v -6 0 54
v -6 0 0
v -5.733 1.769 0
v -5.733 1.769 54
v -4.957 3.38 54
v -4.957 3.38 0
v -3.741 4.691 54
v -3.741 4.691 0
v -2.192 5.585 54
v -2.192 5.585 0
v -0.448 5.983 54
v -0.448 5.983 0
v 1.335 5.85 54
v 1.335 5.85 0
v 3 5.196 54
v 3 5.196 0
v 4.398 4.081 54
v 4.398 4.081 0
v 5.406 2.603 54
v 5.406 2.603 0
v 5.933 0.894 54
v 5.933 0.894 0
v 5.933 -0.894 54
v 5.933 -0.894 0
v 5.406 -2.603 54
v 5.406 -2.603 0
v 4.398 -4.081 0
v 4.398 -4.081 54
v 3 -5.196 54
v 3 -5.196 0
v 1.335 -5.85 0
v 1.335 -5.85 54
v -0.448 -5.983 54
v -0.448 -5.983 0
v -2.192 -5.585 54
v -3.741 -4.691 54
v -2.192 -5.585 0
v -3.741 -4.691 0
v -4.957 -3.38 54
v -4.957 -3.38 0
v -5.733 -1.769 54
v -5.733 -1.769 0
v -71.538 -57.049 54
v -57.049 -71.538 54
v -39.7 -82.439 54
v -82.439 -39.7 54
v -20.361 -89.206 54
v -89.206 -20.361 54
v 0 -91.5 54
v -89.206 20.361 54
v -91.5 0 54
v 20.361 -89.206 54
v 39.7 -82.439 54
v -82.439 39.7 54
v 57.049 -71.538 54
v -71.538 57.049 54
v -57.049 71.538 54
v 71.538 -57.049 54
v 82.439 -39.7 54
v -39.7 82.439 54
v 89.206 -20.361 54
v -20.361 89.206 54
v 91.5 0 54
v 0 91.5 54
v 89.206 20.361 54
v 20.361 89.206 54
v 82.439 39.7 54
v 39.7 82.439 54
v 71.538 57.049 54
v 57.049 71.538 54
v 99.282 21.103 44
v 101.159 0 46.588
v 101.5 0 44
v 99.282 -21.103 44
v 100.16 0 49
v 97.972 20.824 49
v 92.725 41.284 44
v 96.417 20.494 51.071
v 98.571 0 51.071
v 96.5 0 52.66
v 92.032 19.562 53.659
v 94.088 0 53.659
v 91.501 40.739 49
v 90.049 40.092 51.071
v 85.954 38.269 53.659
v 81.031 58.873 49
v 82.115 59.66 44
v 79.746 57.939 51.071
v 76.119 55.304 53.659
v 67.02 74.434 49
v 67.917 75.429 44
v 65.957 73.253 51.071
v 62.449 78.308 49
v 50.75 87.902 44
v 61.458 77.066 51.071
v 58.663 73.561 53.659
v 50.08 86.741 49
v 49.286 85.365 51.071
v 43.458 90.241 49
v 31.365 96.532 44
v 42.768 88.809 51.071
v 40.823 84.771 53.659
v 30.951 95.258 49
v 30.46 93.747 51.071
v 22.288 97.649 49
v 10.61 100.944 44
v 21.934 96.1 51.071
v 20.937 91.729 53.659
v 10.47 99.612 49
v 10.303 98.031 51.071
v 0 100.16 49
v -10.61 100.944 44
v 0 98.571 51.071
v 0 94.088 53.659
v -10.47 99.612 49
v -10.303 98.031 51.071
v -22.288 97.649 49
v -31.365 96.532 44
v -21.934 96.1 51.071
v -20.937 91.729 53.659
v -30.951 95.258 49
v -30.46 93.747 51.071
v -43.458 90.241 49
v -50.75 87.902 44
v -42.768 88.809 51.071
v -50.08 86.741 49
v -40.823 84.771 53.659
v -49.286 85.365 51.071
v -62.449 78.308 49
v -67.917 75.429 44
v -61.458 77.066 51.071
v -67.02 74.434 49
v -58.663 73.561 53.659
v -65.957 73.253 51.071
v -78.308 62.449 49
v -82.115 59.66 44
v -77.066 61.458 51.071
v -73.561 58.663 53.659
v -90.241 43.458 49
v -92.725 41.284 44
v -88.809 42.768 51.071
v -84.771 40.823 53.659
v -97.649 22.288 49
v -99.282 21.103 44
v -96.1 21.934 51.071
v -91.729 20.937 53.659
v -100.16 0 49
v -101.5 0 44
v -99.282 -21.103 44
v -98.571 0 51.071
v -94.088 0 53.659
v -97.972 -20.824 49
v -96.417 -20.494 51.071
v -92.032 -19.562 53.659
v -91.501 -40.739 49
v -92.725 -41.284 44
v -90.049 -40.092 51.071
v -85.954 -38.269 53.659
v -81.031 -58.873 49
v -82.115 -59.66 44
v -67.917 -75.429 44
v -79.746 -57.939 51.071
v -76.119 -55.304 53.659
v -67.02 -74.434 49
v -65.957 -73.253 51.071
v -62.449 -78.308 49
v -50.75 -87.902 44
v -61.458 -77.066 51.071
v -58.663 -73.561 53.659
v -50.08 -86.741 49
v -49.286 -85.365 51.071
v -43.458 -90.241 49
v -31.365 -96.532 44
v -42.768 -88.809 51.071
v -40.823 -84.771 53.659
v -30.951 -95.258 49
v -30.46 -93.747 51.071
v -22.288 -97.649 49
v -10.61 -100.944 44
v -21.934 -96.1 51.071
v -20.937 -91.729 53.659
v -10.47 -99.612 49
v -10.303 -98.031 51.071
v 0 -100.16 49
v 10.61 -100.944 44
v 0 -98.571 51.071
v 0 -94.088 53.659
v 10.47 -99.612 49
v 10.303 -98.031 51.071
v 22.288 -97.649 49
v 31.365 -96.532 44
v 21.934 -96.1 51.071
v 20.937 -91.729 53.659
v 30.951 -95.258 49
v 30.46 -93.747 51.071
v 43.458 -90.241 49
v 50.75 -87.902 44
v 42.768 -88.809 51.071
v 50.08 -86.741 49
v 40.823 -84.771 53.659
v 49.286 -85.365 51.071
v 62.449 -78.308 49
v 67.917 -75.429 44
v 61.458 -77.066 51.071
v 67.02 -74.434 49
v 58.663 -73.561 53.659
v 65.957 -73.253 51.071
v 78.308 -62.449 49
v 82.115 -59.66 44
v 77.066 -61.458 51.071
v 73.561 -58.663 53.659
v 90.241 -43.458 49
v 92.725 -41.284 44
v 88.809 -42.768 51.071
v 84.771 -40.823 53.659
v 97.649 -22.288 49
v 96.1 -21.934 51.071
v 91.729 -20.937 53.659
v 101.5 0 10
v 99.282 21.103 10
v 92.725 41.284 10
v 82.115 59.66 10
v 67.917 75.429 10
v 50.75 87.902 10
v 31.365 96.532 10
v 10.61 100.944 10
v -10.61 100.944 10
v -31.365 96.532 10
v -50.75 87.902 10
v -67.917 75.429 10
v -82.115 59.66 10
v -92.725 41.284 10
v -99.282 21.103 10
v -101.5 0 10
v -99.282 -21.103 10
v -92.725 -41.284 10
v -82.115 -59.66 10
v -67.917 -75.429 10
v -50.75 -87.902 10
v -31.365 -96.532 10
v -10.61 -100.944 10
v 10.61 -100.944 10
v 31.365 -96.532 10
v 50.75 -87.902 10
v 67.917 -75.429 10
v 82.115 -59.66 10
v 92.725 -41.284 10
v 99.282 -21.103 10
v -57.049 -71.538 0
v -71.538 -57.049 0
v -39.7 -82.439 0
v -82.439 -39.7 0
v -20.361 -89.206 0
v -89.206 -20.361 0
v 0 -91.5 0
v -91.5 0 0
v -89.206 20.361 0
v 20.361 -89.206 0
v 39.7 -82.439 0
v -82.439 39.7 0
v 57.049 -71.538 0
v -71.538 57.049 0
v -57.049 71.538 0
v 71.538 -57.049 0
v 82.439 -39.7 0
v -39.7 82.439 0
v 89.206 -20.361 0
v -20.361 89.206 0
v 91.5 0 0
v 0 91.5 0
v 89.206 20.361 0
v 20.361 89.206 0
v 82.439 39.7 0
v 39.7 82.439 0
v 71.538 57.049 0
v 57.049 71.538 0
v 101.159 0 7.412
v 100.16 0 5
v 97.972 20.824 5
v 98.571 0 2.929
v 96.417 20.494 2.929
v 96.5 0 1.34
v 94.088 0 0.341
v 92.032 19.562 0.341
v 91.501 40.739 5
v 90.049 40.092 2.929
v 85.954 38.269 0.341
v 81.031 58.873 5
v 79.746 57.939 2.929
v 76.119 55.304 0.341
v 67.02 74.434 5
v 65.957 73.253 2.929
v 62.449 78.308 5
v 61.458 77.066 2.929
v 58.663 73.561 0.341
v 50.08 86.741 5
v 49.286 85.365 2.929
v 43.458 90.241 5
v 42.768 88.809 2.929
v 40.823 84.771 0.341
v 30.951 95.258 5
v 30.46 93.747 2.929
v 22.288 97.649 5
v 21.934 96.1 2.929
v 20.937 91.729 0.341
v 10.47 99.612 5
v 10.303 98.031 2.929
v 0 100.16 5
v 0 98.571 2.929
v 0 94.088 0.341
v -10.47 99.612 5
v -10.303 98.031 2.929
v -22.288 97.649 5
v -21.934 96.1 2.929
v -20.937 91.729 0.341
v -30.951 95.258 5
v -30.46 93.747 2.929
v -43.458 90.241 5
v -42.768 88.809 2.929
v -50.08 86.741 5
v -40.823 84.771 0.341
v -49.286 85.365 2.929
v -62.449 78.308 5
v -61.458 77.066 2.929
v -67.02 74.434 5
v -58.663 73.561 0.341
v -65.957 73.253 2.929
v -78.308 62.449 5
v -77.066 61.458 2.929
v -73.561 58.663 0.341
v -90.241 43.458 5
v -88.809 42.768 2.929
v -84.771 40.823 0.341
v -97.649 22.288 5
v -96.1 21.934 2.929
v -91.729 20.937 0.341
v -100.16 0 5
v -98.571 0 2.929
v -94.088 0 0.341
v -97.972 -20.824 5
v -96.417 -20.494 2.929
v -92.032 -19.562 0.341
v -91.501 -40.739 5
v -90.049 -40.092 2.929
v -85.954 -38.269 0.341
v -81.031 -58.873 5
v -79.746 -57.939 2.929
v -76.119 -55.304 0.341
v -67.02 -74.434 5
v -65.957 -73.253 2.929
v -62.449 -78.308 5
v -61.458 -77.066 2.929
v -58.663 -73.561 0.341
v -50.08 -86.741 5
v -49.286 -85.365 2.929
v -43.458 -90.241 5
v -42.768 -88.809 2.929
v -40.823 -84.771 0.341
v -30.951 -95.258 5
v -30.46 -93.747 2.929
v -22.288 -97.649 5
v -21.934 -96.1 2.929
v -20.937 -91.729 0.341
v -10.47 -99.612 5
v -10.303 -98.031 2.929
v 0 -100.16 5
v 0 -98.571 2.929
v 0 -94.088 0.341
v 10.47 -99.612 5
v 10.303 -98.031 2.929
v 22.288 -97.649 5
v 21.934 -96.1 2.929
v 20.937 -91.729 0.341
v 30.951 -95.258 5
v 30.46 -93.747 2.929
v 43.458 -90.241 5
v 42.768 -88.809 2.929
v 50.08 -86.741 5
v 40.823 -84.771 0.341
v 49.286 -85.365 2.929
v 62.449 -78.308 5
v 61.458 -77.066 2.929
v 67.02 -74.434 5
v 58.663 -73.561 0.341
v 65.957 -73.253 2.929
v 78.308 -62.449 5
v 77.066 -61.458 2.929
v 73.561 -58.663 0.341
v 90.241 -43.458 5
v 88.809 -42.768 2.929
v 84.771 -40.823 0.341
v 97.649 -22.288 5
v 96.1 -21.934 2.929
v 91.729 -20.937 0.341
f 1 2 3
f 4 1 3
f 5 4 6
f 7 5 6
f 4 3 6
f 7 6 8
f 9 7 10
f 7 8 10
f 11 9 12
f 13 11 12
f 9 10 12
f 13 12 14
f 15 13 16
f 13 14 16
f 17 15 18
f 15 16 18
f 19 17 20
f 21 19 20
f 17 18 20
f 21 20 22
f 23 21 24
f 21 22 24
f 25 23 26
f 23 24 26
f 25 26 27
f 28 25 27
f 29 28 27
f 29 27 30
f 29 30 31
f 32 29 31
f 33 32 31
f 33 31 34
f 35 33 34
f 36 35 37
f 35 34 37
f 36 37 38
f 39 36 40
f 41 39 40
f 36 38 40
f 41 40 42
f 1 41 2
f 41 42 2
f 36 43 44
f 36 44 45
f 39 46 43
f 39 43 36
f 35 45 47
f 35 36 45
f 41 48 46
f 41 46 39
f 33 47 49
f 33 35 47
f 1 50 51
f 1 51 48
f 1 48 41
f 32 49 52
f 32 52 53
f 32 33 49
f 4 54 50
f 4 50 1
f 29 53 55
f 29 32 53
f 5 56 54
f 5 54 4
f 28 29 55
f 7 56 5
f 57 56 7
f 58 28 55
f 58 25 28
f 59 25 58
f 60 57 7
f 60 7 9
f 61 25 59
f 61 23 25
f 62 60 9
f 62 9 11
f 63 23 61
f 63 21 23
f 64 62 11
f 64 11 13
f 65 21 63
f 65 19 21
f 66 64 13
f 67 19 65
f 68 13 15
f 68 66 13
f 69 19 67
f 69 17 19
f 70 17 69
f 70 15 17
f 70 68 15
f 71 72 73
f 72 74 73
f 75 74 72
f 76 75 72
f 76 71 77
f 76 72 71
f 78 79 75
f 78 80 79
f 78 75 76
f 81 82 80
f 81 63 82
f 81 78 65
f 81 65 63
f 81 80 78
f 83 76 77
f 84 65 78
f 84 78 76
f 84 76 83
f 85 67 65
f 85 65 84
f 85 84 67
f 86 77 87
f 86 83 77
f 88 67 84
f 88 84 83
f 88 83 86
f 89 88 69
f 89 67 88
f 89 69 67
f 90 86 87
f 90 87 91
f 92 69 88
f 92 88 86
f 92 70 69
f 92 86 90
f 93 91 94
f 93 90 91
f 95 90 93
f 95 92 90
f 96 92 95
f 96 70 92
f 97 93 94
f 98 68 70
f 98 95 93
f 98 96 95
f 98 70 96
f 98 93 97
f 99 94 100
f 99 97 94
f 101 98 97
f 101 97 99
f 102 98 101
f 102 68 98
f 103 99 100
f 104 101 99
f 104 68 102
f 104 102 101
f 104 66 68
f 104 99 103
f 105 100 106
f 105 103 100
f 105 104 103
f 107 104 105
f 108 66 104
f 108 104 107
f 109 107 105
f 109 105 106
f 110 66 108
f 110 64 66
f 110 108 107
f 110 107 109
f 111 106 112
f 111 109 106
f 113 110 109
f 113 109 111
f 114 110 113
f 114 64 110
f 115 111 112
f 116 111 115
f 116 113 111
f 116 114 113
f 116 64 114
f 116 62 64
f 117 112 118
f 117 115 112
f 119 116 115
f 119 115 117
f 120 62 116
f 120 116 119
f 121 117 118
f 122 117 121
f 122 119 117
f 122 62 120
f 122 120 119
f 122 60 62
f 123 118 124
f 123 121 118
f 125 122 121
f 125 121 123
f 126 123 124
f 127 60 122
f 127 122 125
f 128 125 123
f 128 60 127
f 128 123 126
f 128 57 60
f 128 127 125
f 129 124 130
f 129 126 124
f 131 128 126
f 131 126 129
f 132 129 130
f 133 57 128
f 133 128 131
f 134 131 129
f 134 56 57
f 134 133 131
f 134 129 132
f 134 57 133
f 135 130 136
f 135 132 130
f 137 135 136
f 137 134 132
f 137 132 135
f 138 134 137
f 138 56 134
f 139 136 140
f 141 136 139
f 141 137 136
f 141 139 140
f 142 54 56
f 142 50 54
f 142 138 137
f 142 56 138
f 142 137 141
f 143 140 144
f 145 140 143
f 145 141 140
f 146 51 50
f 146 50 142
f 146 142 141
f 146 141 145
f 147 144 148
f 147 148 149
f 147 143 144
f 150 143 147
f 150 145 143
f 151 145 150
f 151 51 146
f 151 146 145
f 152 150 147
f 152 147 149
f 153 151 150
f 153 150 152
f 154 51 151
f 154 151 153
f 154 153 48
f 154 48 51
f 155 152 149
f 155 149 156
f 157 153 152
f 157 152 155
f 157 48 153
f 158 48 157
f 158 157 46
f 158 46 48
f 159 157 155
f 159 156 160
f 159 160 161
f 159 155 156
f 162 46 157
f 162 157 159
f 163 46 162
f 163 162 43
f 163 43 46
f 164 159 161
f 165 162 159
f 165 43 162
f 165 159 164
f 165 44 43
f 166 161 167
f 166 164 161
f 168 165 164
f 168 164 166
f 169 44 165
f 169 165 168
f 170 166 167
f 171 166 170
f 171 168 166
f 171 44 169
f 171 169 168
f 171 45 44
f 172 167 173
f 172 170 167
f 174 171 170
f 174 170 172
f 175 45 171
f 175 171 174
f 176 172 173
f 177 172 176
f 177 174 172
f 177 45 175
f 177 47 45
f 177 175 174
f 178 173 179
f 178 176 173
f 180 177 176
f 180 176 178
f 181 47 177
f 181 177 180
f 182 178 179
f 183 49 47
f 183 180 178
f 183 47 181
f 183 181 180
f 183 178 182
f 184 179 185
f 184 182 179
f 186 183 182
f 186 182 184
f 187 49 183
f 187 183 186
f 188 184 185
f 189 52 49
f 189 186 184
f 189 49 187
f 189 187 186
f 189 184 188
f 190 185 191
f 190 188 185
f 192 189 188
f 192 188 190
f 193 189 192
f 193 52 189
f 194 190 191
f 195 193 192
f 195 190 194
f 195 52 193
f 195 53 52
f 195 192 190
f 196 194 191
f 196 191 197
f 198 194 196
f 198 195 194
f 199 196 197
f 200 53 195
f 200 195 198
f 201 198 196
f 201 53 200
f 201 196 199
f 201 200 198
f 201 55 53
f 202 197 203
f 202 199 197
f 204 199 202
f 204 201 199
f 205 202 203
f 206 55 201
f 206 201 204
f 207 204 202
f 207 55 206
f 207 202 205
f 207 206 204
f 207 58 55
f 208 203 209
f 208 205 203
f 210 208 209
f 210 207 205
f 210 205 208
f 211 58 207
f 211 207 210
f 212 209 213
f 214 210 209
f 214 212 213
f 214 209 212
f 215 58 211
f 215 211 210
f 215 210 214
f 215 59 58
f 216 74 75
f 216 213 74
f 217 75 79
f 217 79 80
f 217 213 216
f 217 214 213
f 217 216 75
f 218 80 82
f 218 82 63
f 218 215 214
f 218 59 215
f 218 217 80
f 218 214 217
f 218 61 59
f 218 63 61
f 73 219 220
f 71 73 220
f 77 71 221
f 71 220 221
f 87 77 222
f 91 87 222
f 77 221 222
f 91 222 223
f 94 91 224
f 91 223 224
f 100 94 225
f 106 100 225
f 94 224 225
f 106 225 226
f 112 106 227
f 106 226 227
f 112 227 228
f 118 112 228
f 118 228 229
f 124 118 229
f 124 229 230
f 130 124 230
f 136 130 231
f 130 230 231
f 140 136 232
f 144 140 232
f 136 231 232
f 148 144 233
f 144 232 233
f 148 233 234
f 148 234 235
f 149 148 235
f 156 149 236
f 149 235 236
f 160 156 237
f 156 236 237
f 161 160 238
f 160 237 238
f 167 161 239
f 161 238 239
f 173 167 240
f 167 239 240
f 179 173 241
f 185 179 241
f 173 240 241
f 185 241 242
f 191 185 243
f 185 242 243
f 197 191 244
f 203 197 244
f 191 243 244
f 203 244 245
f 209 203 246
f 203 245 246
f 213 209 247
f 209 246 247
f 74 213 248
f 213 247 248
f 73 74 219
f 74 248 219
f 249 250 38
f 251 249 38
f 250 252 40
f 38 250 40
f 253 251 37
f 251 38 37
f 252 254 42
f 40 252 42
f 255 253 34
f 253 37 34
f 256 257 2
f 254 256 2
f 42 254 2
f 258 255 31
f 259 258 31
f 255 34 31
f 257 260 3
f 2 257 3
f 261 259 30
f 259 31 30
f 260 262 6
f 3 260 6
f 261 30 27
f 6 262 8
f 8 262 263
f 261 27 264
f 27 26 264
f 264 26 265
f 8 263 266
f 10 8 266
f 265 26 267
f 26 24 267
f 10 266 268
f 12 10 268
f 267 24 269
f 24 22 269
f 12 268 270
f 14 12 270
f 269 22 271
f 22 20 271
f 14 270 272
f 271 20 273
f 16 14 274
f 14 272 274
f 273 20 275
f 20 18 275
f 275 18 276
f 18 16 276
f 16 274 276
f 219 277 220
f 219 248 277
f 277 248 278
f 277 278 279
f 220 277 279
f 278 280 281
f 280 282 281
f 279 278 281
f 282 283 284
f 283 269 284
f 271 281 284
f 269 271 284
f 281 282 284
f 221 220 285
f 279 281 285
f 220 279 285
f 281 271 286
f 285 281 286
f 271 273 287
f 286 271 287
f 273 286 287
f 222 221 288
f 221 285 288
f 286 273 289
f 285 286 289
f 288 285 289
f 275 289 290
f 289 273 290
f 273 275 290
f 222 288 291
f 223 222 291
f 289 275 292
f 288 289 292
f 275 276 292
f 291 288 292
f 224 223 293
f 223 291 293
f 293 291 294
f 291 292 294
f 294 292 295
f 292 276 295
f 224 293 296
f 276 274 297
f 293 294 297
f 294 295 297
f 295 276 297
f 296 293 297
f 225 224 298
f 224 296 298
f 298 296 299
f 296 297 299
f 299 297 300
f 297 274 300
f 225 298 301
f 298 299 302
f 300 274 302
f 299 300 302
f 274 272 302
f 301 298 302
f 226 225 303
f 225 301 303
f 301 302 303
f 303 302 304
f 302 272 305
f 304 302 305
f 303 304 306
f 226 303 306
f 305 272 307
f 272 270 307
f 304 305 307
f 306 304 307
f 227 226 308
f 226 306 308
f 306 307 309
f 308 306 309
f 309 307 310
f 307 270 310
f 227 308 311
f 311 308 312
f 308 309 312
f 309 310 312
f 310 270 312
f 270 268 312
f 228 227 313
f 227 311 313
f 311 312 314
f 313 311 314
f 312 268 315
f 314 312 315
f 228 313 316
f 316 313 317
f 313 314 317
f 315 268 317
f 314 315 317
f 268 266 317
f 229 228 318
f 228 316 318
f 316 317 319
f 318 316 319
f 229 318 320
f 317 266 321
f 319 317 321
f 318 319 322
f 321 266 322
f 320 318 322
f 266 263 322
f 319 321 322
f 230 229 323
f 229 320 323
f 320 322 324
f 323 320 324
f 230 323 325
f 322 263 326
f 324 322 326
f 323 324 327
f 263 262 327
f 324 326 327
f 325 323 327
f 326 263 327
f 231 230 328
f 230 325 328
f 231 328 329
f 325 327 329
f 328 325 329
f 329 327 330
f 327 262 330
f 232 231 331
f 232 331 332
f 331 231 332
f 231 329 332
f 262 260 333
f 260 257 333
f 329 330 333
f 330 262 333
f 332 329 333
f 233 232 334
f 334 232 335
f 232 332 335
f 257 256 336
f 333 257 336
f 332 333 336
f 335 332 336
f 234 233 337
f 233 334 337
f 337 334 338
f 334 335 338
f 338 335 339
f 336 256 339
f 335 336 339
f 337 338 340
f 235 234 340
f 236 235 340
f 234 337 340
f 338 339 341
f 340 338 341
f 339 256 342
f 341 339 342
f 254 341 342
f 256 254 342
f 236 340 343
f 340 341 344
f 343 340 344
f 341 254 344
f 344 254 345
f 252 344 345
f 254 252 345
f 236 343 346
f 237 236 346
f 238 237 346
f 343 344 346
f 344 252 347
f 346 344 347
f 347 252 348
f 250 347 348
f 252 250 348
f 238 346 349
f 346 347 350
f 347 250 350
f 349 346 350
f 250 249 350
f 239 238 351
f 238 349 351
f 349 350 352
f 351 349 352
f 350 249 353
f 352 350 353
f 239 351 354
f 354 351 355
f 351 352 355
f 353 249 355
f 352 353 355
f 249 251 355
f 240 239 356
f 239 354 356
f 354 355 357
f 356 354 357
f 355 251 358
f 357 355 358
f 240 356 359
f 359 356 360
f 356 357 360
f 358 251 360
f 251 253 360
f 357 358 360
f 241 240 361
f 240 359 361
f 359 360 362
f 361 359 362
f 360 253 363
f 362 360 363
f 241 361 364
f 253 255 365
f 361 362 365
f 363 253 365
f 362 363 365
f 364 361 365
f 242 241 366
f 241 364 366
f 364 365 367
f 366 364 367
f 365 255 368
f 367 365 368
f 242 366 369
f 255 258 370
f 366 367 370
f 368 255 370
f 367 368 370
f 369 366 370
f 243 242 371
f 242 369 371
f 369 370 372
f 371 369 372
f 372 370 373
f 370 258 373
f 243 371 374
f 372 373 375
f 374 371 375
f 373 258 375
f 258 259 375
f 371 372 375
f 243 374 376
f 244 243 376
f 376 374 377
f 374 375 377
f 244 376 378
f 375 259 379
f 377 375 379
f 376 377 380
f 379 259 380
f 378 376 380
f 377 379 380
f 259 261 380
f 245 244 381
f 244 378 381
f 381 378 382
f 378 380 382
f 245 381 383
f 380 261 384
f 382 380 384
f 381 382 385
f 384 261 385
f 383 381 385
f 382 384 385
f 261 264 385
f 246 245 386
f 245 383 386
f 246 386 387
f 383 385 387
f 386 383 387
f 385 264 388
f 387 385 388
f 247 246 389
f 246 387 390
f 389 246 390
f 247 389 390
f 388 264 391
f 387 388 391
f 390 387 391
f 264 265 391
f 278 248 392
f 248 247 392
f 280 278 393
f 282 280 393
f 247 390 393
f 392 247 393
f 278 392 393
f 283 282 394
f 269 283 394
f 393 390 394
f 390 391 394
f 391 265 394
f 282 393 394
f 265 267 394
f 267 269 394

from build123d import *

# Parameters (mm, degrees)
SKETCH_1_R          = 101.5
EXTRUDE_1_DEPTH     = 54
FILLET_1_R          = 10
SKETCH_2_R          = 6
CUT_EXTRUDE_1_DEPTH = 54


with BuildPart() as part:
    # 草圖1 → 填料-伸長1 (new body)
    with BuildSketch(Plane.XY):
        Circle(SKETCH_1_R)
    extrude(amount=EXTRUDE_1_DEPTH)

    # 圓角1
    fillet_1_edges = [part.edges().sort_by_distance(p)[0] for p in [
        (-101.5, 0, 0),
        (-101.5, 0, 54),
    ]]
    fillet(fillet_1_edges, radius=FILLET_1_R)

    # 草圖2 → 除料-伸長1 (cut)
    with BuildSketch(Plane(origin=(0, 0, 0), x_dir=(-1, 0, 0), z_dir=(0, 0, -1))):
        Circle(SKETCH_2_R)
    extrude(amount=-CUT_EXTRUDE_1_DEPTH, mode=Mode.SUBTRACT)


solid = part.part
